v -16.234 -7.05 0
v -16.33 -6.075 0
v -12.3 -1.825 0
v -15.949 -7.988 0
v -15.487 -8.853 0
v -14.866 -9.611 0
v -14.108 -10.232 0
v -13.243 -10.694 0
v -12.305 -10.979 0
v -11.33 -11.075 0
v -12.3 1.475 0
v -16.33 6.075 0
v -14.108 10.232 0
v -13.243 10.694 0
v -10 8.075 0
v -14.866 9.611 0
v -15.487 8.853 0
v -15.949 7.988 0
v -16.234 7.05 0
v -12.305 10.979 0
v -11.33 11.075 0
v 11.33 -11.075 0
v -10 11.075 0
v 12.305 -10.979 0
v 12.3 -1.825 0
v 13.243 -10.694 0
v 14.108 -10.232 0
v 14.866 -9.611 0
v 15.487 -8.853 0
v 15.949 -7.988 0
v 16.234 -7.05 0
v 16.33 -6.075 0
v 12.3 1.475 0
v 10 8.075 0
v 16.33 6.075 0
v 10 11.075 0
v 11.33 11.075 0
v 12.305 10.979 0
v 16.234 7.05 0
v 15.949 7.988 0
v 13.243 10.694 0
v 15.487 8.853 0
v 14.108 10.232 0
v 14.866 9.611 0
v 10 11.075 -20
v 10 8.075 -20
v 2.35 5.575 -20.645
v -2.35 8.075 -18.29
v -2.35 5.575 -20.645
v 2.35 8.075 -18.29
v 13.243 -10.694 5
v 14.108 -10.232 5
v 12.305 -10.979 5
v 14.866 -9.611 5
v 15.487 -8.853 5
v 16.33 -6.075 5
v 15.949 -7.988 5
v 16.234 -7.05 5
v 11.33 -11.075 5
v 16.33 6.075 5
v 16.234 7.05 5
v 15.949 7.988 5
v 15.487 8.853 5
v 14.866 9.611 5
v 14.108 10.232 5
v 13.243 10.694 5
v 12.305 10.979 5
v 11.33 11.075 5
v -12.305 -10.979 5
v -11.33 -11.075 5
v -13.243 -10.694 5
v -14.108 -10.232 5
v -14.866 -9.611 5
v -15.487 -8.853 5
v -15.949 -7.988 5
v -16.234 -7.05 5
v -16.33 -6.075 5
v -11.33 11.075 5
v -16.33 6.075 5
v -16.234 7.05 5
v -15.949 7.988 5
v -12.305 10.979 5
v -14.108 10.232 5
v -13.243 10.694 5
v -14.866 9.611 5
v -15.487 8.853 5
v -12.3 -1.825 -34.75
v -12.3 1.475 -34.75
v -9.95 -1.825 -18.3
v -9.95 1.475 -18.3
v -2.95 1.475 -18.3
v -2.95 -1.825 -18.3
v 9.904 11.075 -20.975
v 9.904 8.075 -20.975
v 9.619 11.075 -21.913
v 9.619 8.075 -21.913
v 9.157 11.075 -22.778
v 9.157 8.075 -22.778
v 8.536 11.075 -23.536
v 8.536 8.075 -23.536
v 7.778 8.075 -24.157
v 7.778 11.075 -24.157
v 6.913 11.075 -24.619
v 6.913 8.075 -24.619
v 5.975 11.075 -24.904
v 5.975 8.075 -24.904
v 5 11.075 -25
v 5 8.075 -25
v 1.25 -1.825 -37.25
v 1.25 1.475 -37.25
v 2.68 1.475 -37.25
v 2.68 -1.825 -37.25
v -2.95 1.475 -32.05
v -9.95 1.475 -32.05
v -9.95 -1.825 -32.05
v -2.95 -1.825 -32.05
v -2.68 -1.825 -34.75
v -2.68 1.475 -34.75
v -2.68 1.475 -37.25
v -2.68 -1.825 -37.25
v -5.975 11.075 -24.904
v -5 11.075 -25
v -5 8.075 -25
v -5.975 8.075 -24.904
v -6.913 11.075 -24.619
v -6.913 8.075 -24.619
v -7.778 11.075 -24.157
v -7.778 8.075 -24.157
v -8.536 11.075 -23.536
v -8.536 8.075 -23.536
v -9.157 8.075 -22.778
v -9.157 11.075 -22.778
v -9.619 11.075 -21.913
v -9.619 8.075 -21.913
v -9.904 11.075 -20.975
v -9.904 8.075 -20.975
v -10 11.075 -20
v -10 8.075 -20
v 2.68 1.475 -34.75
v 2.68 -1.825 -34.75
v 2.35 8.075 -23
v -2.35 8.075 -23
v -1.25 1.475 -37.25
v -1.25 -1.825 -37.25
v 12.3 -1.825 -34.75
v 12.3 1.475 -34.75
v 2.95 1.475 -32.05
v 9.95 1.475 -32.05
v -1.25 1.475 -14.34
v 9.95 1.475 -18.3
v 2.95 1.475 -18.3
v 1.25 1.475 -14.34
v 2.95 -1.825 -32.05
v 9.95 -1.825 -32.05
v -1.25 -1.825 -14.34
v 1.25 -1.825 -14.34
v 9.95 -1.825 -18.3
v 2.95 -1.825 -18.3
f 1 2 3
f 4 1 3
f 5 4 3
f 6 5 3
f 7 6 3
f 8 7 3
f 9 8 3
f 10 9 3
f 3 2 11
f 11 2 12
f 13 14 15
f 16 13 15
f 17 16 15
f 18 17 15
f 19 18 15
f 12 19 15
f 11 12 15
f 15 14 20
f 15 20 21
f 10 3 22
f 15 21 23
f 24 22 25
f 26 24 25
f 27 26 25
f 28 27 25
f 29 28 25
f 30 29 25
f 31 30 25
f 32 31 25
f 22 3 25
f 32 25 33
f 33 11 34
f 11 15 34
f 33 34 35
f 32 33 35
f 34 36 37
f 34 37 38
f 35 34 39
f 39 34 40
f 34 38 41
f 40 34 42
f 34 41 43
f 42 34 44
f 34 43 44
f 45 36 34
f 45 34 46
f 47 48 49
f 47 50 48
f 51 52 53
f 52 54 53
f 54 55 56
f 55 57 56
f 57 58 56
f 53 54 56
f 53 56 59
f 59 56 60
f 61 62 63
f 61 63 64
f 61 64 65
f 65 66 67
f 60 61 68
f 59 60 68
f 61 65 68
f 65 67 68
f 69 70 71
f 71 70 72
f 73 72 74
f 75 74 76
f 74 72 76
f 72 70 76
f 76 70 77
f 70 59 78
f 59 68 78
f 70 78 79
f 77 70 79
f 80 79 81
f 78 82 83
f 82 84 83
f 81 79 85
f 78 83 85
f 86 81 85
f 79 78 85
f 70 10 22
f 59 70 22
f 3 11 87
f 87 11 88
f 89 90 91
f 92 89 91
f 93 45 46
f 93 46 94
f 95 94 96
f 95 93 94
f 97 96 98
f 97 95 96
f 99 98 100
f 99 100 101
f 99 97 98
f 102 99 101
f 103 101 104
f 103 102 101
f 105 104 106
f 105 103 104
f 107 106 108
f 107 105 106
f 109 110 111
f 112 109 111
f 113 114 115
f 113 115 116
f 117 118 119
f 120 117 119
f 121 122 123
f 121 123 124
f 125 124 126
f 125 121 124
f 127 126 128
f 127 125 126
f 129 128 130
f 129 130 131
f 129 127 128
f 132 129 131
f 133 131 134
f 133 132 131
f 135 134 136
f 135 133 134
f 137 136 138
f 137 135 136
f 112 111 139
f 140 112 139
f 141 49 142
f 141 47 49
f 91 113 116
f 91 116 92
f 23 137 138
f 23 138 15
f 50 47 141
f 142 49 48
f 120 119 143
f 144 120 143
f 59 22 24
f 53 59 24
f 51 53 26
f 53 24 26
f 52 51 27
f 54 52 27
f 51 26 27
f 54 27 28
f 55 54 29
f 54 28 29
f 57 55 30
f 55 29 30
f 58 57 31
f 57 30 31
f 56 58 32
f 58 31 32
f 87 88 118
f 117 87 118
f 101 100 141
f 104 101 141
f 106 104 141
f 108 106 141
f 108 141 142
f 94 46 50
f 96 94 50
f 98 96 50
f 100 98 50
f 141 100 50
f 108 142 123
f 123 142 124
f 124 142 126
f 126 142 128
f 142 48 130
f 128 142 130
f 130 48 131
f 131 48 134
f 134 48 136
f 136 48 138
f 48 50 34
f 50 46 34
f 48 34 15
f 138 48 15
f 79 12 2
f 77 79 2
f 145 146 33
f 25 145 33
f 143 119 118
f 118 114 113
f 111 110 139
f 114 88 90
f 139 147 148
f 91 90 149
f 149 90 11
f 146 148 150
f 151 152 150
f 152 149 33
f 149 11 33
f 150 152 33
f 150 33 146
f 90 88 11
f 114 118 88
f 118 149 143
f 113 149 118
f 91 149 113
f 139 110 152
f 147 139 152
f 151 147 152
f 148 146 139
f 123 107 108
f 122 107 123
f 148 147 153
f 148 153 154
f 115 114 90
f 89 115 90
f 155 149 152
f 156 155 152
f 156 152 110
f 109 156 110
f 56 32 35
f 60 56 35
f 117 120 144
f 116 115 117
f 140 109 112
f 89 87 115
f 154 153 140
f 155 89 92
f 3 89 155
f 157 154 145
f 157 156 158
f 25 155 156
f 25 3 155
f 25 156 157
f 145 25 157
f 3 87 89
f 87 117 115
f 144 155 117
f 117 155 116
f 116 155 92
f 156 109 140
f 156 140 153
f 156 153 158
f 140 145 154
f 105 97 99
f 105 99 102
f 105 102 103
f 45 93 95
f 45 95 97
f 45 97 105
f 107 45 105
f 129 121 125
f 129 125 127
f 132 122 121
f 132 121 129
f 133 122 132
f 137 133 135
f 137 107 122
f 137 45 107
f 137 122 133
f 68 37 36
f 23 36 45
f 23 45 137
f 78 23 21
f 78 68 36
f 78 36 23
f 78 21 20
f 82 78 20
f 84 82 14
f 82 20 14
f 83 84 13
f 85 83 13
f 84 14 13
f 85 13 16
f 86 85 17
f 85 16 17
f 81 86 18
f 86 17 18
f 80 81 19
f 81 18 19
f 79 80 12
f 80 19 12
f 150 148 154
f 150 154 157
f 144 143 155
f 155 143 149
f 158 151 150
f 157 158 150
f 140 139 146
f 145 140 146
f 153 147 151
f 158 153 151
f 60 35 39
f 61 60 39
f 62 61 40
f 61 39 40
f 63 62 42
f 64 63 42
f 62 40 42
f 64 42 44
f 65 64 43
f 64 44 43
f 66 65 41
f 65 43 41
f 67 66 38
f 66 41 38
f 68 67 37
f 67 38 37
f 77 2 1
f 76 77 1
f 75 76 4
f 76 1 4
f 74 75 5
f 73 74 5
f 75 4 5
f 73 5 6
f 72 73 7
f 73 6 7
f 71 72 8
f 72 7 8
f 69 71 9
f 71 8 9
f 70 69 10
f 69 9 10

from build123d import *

# Parameters (mm, degrees)
F1_DEPTH = 5
F3_DEPTH = 3
F5_DEPTH = 2.35
F7_W     = 7
F7_H     = 13.75
F8_DEPTH = 3.3


with BuildPart() as f1:
    # F0 (on Top) → F1 (new body)
    with BuildSketch(Plane.XY):
        with BuildLine():
            ThreePointArc((16.33, 6.075), (14.8655339059, 9.6105339059), (11.33, 11.075))
            Line((11.33, 11.075), (-11.33, 11.075))
            ThreePointArc((-11.33, 11.075), (-14.8655339059, 9.6105339059), (-16.33, 6.075))
            Line((-16.33, 6.075), (-16.33, -6.075))
            ThreePointArc((-16.33, -6.075), (-14.8655339059, -9.6105339059), (-11.33, -11.075))
            Line((-11.33, -11.075), (11.33, -11.075))
            ThreePointArc((11.33, -11.075), (14.8655339059, -9.6105339059), (16.33, -6.075))
            Line((16.33, -6.075), (16.33, 6.075))
        make_face()
    extrude(amount=F1_DEPTH)

    # F2 (on face) → F3 (join)
    with BuildSketch(Plane(origin=(0, 11.075, 0), x_dir=(-1, 0, 0), z_dir=(0, 1, 0))):
        with BuildLine():
            Line((10, -20), (10, 5))
            Line((10, 5), (-10, 5))
            Line((-10, 5), (-10, -20))
            ThreePointArc((-10, -20), (-8.5355339059, -23.5355339059), (-5, -25))
            Line((-5, -25), (5, -25))
            ThreePointArc((5, -25), (8.5355339059, -23.5355339059), (10, -20))
        make_face()
    extrude(amount=-F3_DEPTH)

    # F4 (on Right) → F5 (join, symmetric)
    with BuildSketch(Plane.YZ):
        Polygon((5.575, -20.645), (8.075, -23), (8.075, -18.29), align=None)
    extrude(amount=F5_DEPTH, both=True)

    # F7 (on offset) → F8 (join)
    with BuildSketch(Plane.XZ.offset(-1.475)):
        Polygon((12.3, 5), (-12.3, 5), (-12.3, -34.75), (-2.68, -34.75), (-2.68, -37.25), (-1.25, -37.25), (-1.25, -14.34), (1.25, -14.34), (1.25, -37.25), (2.68, -37.25), (2.68, -34.75), (12.3, -34.75), align=None)
        with Locations((-6.45, -25.175)):
            Rectangle(F7_W, F7_H, mode=Mode.SUBTRACT)
        with Locations((6.45, -25.175)):
            Rectangle(F7_W, F7_H, mode=Mode.SUBTRACT)
    extrude(amount=F8_DEPTH)


solid = f1.part
